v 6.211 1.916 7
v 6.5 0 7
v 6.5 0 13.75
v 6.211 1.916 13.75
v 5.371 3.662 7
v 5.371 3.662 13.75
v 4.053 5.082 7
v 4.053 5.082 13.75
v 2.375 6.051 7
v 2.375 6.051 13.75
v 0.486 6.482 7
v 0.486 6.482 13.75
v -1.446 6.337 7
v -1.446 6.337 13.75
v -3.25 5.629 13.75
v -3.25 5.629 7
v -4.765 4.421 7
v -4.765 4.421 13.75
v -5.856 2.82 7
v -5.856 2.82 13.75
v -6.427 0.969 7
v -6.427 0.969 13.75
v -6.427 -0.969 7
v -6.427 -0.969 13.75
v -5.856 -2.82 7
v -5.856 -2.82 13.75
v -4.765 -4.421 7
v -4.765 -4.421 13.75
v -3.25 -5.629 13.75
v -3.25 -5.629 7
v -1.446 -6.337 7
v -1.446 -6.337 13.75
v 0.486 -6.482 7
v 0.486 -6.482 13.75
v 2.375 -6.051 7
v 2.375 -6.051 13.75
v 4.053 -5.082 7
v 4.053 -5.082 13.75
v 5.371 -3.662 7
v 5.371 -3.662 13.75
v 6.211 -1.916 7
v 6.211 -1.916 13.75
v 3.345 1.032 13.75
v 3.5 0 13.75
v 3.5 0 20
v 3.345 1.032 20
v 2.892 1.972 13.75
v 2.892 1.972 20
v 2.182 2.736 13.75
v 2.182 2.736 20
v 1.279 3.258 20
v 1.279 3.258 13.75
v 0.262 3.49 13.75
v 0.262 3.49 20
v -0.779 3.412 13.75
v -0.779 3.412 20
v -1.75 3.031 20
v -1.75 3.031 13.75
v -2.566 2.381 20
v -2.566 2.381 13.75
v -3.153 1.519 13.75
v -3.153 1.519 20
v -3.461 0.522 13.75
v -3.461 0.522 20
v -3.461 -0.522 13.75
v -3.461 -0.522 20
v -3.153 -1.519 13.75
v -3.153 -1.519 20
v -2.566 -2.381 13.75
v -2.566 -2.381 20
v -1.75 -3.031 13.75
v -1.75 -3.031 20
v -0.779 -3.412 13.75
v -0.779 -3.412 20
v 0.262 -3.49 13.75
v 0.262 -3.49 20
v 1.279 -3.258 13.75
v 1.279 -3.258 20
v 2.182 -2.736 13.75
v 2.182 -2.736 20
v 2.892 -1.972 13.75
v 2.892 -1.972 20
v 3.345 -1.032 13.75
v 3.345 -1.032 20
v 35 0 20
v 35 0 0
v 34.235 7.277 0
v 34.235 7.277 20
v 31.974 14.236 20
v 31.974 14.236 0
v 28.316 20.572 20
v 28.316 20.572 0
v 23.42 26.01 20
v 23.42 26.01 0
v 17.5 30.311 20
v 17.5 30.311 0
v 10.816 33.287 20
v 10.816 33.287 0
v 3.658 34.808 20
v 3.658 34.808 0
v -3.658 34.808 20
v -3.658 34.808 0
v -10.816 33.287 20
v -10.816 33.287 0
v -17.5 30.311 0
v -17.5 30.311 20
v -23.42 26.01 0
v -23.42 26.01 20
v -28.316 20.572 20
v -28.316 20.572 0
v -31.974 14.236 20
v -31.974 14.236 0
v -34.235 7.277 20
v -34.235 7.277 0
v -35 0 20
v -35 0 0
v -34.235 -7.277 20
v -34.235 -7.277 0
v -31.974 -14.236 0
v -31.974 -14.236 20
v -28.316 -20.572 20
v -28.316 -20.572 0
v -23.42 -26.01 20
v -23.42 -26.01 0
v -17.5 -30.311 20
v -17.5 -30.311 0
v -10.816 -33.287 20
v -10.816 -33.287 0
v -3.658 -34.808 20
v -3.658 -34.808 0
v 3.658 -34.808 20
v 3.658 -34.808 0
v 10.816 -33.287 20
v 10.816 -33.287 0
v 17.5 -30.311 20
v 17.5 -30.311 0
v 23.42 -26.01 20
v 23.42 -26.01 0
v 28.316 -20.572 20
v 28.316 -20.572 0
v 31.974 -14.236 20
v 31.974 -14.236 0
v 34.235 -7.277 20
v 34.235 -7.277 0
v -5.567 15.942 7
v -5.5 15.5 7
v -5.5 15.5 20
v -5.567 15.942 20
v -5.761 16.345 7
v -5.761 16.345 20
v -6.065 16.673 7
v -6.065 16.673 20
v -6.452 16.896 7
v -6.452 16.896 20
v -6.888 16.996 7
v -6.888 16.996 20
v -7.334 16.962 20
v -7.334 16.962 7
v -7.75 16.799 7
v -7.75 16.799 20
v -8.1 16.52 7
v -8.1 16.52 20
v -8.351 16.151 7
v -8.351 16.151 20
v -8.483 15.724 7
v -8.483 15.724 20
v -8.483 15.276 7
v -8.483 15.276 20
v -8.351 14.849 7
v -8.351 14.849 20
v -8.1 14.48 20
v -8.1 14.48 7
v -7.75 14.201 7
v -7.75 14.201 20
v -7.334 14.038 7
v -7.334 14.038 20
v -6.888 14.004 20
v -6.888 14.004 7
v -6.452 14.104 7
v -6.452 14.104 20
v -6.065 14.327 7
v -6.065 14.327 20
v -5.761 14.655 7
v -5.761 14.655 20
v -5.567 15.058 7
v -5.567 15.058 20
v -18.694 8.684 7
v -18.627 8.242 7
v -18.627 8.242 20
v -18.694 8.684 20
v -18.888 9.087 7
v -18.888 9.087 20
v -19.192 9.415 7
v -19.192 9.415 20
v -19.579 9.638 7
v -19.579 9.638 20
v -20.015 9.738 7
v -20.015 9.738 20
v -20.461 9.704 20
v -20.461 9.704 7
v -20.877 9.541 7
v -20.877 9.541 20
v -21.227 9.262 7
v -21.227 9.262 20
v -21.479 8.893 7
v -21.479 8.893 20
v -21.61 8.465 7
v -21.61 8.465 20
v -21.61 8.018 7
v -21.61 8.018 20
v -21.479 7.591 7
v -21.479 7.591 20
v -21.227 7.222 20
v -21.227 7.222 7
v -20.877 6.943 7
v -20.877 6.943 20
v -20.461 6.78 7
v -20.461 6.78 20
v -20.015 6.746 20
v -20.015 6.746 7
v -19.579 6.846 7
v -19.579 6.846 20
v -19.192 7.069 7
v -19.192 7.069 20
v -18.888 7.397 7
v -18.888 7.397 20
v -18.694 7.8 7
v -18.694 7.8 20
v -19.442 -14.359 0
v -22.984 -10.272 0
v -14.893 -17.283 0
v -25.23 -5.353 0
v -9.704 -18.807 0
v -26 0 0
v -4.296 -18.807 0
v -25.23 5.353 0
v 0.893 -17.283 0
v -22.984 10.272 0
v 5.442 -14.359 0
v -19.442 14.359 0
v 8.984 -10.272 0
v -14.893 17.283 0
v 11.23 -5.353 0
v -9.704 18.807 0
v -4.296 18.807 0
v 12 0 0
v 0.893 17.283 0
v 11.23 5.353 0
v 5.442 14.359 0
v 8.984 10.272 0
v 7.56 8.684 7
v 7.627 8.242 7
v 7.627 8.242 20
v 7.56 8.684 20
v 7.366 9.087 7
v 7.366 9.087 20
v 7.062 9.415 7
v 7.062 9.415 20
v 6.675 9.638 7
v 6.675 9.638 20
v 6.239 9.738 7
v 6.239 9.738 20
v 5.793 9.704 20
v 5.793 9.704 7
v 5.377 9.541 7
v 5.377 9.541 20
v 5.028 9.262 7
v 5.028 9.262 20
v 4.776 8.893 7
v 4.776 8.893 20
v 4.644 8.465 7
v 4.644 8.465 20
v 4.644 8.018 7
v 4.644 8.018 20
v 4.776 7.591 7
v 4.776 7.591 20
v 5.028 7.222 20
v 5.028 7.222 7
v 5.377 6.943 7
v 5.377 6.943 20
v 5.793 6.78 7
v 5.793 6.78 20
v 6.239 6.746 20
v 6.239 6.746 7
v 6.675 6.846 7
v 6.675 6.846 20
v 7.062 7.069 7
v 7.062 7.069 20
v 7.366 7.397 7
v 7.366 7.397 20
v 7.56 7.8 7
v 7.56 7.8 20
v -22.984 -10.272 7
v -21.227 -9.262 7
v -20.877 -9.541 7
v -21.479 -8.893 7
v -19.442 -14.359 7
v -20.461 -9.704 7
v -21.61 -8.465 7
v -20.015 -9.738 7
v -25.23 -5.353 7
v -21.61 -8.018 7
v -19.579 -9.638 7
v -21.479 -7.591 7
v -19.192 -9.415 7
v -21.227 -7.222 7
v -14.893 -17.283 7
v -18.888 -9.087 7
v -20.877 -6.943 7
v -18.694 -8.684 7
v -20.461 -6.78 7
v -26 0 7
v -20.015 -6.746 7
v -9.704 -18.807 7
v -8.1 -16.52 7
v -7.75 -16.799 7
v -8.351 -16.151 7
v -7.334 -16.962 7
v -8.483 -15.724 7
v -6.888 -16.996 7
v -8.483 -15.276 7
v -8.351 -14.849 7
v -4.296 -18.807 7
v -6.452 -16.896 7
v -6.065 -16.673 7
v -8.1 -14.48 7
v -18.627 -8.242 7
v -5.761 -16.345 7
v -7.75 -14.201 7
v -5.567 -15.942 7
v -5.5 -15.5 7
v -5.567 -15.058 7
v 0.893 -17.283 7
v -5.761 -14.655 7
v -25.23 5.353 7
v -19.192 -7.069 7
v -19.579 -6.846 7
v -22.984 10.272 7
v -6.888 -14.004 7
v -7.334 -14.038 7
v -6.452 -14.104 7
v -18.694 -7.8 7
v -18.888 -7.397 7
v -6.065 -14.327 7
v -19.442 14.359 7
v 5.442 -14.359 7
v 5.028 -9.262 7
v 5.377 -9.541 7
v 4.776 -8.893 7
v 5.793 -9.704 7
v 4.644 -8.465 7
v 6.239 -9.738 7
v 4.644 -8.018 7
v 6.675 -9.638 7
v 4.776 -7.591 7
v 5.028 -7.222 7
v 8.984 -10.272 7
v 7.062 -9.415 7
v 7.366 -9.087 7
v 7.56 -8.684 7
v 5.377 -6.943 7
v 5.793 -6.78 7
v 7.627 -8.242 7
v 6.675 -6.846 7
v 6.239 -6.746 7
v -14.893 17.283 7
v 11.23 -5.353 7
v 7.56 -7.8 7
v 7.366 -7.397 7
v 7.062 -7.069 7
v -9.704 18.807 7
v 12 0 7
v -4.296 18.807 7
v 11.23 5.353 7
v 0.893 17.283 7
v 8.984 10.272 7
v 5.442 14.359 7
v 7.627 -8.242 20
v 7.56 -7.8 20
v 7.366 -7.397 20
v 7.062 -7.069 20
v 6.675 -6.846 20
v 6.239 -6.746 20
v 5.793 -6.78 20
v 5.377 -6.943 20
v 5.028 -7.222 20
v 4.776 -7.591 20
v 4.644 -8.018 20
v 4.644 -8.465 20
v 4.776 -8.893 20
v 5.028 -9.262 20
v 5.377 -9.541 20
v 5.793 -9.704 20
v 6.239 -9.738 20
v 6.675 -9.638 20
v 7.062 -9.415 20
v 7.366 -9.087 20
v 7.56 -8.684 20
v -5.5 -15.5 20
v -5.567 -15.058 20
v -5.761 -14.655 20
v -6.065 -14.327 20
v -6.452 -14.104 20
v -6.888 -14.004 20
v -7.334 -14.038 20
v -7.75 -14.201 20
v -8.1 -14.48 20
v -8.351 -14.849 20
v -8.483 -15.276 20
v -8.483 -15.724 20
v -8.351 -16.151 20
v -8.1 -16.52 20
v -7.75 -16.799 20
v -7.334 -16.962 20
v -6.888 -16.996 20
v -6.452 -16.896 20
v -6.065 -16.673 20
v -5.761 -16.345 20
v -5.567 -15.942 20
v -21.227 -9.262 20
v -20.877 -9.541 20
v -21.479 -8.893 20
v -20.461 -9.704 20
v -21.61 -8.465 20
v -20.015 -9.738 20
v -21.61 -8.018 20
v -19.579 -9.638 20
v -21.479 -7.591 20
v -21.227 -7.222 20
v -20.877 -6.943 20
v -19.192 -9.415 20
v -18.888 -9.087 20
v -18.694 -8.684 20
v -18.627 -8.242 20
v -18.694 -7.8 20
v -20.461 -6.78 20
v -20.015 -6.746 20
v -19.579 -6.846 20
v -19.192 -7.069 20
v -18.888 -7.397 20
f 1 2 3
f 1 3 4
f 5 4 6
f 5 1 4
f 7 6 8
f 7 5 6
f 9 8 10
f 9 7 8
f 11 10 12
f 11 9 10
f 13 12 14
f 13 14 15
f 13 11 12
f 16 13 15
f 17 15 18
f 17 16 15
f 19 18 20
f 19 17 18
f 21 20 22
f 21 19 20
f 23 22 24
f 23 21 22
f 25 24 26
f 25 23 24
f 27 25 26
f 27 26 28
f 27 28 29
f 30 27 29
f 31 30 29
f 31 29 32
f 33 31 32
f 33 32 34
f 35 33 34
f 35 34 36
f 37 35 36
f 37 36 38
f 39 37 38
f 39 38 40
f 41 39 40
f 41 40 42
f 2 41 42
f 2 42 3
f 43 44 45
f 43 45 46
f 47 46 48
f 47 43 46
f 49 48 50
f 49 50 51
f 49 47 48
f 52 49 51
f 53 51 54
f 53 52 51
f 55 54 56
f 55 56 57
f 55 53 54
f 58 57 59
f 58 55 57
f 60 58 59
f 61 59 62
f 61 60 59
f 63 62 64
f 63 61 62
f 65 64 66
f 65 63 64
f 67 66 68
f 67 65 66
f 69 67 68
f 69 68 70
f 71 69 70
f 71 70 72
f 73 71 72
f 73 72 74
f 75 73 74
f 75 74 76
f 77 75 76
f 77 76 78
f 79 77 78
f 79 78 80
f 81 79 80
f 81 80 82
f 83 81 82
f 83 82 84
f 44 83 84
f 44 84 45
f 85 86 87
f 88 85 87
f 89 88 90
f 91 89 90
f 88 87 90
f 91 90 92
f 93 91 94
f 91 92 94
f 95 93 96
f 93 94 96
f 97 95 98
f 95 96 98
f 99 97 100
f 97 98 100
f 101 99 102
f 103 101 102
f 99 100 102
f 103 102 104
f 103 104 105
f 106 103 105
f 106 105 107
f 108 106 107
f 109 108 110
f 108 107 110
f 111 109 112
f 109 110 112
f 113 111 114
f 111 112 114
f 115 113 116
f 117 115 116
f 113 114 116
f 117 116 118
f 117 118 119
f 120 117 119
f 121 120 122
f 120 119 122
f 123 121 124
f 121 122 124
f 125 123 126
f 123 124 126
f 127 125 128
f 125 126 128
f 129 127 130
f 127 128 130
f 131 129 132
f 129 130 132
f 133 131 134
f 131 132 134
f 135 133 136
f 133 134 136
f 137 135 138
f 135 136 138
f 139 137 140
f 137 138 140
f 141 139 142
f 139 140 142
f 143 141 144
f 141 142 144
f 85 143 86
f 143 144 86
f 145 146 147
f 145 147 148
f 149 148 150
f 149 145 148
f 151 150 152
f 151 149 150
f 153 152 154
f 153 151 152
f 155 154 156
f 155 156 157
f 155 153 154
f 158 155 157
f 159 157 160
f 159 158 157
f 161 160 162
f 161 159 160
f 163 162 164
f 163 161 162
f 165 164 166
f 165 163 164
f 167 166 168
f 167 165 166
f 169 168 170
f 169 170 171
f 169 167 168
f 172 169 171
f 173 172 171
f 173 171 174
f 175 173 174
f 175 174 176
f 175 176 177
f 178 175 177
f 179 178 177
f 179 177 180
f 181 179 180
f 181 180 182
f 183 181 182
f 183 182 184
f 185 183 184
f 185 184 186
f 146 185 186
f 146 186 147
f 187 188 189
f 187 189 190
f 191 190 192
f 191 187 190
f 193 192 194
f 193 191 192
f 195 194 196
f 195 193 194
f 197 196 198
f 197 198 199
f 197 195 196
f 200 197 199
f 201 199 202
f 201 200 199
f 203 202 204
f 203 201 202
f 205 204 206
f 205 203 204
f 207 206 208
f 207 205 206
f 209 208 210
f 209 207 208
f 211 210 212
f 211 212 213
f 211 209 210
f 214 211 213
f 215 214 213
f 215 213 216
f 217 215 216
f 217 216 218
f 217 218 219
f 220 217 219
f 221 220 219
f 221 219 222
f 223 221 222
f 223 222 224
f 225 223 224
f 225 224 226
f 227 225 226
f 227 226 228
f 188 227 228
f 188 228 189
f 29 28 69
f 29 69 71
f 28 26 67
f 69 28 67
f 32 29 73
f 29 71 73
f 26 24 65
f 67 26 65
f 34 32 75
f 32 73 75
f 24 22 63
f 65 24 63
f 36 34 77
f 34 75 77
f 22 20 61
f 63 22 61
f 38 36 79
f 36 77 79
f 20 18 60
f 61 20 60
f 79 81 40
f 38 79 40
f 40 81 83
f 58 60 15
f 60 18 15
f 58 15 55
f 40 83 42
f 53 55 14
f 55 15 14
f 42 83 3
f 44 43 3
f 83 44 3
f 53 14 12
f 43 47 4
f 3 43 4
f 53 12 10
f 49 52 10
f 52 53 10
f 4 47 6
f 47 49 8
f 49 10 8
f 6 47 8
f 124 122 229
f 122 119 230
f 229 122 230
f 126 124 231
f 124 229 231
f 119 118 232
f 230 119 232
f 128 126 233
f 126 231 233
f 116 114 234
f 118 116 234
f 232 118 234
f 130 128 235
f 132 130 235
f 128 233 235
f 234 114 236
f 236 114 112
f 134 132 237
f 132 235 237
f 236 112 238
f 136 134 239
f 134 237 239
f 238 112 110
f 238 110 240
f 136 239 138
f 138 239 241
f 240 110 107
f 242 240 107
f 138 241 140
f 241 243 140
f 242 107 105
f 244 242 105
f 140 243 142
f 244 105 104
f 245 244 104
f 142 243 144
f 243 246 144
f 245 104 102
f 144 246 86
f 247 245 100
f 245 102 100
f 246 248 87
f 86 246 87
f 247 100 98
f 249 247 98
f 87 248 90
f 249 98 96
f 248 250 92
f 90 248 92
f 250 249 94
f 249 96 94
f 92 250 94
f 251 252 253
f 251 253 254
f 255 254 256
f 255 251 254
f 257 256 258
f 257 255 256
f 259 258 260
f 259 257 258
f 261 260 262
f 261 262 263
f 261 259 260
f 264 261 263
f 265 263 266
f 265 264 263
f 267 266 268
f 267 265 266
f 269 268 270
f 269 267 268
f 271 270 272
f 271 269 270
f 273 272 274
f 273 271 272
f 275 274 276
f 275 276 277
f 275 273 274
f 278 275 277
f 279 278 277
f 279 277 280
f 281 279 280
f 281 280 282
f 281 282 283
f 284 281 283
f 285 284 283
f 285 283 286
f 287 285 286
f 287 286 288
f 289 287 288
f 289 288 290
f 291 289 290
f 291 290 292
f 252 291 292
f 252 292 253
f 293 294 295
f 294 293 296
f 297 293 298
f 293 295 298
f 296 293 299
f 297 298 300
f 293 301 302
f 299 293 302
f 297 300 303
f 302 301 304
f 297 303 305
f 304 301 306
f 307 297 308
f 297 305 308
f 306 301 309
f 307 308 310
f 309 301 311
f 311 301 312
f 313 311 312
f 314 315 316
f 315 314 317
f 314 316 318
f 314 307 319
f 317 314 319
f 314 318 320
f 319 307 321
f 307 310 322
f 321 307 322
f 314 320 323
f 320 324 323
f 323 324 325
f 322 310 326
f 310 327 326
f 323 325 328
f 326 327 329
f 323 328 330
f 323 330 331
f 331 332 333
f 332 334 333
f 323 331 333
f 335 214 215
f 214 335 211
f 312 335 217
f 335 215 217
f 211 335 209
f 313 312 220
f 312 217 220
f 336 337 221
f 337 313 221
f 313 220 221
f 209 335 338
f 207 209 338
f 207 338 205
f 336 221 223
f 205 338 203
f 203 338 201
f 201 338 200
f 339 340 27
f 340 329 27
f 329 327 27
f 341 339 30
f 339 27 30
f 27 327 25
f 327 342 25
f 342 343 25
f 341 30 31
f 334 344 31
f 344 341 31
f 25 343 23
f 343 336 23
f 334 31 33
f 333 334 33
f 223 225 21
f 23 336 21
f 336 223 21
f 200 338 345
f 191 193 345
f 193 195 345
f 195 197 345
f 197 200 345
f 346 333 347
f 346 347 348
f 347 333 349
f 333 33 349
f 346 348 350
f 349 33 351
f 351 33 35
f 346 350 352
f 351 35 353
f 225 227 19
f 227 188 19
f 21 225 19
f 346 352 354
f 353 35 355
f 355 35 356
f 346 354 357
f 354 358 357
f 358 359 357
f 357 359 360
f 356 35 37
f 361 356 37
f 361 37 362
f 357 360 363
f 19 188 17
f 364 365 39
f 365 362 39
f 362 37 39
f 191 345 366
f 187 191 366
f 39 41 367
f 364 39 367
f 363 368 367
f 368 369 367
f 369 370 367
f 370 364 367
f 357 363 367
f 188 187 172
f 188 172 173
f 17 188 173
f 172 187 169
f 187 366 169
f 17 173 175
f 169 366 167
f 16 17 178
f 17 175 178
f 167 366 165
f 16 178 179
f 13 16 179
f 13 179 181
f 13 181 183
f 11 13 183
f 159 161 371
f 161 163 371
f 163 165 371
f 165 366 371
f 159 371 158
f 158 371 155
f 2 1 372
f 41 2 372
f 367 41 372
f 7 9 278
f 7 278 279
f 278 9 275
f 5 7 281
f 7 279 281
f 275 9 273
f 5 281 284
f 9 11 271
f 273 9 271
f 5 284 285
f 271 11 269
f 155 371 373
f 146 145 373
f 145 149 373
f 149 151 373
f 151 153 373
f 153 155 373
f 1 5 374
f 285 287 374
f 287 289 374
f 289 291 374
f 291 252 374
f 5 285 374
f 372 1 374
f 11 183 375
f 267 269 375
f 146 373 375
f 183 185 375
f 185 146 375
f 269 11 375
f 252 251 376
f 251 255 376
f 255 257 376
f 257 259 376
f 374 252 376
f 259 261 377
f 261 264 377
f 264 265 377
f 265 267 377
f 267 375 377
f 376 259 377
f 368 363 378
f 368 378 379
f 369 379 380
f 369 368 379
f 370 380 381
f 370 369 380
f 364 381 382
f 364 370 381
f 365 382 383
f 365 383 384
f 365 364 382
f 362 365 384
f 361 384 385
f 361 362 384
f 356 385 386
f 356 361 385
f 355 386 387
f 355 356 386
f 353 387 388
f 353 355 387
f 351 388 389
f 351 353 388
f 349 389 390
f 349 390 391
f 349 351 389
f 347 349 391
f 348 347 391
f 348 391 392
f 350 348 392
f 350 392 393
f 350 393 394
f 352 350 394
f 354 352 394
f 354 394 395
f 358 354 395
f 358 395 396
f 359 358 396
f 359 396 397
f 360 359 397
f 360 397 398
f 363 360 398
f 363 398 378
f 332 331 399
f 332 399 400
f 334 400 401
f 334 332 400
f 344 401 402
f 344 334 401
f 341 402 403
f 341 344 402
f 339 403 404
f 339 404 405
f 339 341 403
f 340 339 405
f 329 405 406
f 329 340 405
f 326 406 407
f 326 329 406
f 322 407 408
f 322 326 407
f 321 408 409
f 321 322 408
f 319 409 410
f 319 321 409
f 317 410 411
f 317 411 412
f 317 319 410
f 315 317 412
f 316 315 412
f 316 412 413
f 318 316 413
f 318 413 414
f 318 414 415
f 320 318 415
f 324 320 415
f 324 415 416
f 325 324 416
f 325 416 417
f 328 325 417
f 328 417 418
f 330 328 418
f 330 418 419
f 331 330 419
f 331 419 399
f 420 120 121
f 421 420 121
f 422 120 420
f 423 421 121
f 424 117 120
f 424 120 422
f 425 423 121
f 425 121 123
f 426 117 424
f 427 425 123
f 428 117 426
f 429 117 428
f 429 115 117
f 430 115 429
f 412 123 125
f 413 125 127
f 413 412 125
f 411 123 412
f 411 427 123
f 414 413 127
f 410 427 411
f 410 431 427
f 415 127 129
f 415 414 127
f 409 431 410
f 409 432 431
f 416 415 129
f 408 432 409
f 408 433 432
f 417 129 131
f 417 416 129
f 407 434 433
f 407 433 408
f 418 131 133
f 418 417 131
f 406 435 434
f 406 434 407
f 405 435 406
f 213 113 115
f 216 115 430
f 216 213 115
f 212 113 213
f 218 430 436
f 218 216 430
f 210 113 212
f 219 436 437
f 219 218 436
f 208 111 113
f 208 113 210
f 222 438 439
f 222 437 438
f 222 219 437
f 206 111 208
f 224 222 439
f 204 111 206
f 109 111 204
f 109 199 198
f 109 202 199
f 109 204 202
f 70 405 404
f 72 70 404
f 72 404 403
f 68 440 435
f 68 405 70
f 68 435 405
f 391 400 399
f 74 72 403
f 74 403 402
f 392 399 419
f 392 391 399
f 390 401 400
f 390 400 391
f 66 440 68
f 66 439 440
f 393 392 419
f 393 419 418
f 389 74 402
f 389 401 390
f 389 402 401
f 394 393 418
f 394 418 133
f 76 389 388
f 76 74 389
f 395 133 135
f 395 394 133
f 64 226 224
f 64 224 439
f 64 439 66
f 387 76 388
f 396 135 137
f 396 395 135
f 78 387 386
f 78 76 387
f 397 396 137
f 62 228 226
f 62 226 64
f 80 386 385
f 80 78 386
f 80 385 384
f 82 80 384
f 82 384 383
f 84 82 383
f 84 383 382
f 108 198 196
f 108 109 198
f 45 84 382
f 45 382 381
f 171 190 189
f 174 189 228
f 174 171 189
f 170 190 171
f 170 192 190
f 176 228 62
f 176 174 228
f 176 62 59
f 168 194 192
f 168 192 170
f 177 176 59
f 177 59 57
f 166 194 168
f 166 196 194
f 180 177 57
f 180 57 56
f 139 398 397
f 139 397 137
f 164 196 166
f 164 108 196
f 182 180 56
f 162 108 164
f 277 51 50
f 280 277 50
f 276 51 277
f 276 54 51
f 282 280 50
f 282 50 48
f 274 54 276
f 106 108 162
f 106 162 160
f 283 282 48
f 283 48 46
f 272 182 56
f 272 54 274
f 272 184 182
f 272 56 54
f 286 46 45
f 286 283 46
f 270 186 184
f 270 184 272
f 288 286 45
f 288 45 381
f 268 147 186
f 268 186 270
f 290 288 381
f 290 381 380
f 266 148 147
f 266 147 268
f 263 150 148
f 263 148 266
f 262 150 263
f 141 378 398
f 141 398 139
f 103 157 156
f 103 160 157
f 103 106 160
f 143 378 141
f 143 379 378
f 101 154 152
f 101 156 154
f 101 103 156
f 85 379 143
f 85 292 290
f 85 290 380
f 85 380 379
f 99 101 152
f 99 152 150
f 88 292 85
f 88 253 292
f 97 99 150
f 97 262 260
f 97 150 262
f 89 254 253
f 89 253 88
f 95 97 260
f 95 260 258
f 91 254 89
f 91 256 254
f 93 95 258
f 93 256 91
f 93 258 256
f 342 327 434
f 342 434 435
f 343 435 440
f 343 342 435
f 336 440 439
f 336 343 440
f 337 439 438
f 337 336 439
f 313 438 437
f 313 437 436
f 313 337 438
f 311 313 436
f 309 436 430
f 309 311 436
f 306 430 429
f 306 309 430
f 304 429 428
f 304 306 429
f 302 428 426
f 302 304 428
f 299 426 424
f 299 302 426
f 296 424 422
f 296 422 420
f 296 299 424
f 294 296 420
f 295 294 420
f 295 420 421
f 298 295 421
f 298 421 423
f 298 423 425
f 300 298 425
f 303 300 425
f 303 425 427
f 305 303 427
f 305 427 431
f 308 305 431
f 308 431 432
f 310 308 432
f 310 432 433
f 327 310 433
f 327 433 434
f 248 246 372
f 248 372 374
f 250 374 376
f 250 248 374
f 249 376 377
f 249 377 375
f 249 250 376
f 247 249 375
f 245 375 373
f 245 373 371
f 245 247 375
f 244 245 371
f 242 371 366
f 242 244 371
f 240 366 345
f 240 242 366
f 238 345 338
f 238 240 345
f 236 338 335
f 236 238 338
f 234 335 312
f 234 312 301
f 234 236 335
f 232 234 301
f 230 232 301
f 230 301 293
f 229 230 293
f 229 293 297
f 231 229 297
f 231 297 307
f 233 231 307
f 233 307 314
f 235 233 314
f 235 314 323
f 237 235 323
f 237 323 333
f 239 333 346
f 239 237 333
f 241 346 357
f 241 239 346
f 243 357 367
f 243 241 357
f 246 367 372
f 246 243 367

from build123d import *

# Parameters (mm, degrees)
F0_R     = 35
F0_R_2   = 19
F0_R_3   = 1.5
F0_R_4   = 6.5
F0_R_5   = 3.5
F1_DEPTH = 20
F2_DEPTH = 7
F3_DEPTH = 13.75


with BuildPart() as f1:
    # F0 (on Top) → F1 (new body)
    with BuildSketch(Plane.XY):
        Circle(F0_R)
        with Locations((-7, 0)):
            Circle(F0_R_2, mode=Mode.SUBTRACT)
        with Locations((-7, 0)):
            Circle(F0_R_2)
        with Locations((-20.1270902899, -8.2419354839)):
            Circle(F0_R_3, mode=Mode.SUBTRACT)
        with Locations((-7, -15.5)):
            Circle(F0_R_3, mode=Mode.SUBTRACT)
        with Locations((6.1270902899, -8.2419354839)):
            Circle(F0_R_3, mode=Mode.SUBTRACT)
        with Locations((-20.1270902899, 8.2419354839)):
            Circle(F0_R_3, mode=Mode.SUBTRACT)
        with Locations((-7, 15.5)):
            Circle(F0_R_3, mode=Mode.SUBTRACT)
        Circle(F0_R_4, mode=Mode.SUBTRACT)
        with Locations((6.1270902899, 8.2419354839)):
            Circle(F0_R_3, mode=Mode.SUBTRACT)
        Circle(F0_R_4)
        Circle(F0_R_5, mode=Mode.SUBTRACT)
    extrude(amount=F1_DEPTH)

    # F0 (on Top) → F2 (cut)
    with BuildSketch(Plane.XY):
        with Locations((-7, 0)):
            Circle(F0_R_2)
        with Locations((-20.1270902899, -8.2419354839)):
            Circle(F0_R_3, mode=Mode.SUBTRACT)
        with Locations((-7, -15.5)):
            Circle(F0_R_3, mode=Mode.SUBTRACT)
        with Locations((6.1270902899, -8.2419354839)):
            Circle(F0_R_3, mode=Mode.SUBTRACT)
        with Locations((-20.1270902899, 8.2419354839)):
            Circle(F0_R_3, mode=Mode.SUBTRACT)
        with Locations((-7, 15.5)):
            Circle(F0_R_3, mode=Mode.SUBTRACT)
        Circle(F0_R_4, mode=Mode.SUBTRACT)
        with Locations((6.1270902899, 8.2419354839)):
            Circle(F0_R_3, mode=Mode.SUBTRACT)
    extrude(amount=F2_DEPTH, mode=Mode.SUBTRACT)

    # F3 (cut): a face of the model
    f3_faces = [f1.faces().sort_by_distance(p)[0] for p in [
        (-6.3161522369, 0, 0),
    ]]
    extrude(f3_faces, amount=-F3_DEPTH, mode=Mode.SUBTRACT)


solid = f1.part
